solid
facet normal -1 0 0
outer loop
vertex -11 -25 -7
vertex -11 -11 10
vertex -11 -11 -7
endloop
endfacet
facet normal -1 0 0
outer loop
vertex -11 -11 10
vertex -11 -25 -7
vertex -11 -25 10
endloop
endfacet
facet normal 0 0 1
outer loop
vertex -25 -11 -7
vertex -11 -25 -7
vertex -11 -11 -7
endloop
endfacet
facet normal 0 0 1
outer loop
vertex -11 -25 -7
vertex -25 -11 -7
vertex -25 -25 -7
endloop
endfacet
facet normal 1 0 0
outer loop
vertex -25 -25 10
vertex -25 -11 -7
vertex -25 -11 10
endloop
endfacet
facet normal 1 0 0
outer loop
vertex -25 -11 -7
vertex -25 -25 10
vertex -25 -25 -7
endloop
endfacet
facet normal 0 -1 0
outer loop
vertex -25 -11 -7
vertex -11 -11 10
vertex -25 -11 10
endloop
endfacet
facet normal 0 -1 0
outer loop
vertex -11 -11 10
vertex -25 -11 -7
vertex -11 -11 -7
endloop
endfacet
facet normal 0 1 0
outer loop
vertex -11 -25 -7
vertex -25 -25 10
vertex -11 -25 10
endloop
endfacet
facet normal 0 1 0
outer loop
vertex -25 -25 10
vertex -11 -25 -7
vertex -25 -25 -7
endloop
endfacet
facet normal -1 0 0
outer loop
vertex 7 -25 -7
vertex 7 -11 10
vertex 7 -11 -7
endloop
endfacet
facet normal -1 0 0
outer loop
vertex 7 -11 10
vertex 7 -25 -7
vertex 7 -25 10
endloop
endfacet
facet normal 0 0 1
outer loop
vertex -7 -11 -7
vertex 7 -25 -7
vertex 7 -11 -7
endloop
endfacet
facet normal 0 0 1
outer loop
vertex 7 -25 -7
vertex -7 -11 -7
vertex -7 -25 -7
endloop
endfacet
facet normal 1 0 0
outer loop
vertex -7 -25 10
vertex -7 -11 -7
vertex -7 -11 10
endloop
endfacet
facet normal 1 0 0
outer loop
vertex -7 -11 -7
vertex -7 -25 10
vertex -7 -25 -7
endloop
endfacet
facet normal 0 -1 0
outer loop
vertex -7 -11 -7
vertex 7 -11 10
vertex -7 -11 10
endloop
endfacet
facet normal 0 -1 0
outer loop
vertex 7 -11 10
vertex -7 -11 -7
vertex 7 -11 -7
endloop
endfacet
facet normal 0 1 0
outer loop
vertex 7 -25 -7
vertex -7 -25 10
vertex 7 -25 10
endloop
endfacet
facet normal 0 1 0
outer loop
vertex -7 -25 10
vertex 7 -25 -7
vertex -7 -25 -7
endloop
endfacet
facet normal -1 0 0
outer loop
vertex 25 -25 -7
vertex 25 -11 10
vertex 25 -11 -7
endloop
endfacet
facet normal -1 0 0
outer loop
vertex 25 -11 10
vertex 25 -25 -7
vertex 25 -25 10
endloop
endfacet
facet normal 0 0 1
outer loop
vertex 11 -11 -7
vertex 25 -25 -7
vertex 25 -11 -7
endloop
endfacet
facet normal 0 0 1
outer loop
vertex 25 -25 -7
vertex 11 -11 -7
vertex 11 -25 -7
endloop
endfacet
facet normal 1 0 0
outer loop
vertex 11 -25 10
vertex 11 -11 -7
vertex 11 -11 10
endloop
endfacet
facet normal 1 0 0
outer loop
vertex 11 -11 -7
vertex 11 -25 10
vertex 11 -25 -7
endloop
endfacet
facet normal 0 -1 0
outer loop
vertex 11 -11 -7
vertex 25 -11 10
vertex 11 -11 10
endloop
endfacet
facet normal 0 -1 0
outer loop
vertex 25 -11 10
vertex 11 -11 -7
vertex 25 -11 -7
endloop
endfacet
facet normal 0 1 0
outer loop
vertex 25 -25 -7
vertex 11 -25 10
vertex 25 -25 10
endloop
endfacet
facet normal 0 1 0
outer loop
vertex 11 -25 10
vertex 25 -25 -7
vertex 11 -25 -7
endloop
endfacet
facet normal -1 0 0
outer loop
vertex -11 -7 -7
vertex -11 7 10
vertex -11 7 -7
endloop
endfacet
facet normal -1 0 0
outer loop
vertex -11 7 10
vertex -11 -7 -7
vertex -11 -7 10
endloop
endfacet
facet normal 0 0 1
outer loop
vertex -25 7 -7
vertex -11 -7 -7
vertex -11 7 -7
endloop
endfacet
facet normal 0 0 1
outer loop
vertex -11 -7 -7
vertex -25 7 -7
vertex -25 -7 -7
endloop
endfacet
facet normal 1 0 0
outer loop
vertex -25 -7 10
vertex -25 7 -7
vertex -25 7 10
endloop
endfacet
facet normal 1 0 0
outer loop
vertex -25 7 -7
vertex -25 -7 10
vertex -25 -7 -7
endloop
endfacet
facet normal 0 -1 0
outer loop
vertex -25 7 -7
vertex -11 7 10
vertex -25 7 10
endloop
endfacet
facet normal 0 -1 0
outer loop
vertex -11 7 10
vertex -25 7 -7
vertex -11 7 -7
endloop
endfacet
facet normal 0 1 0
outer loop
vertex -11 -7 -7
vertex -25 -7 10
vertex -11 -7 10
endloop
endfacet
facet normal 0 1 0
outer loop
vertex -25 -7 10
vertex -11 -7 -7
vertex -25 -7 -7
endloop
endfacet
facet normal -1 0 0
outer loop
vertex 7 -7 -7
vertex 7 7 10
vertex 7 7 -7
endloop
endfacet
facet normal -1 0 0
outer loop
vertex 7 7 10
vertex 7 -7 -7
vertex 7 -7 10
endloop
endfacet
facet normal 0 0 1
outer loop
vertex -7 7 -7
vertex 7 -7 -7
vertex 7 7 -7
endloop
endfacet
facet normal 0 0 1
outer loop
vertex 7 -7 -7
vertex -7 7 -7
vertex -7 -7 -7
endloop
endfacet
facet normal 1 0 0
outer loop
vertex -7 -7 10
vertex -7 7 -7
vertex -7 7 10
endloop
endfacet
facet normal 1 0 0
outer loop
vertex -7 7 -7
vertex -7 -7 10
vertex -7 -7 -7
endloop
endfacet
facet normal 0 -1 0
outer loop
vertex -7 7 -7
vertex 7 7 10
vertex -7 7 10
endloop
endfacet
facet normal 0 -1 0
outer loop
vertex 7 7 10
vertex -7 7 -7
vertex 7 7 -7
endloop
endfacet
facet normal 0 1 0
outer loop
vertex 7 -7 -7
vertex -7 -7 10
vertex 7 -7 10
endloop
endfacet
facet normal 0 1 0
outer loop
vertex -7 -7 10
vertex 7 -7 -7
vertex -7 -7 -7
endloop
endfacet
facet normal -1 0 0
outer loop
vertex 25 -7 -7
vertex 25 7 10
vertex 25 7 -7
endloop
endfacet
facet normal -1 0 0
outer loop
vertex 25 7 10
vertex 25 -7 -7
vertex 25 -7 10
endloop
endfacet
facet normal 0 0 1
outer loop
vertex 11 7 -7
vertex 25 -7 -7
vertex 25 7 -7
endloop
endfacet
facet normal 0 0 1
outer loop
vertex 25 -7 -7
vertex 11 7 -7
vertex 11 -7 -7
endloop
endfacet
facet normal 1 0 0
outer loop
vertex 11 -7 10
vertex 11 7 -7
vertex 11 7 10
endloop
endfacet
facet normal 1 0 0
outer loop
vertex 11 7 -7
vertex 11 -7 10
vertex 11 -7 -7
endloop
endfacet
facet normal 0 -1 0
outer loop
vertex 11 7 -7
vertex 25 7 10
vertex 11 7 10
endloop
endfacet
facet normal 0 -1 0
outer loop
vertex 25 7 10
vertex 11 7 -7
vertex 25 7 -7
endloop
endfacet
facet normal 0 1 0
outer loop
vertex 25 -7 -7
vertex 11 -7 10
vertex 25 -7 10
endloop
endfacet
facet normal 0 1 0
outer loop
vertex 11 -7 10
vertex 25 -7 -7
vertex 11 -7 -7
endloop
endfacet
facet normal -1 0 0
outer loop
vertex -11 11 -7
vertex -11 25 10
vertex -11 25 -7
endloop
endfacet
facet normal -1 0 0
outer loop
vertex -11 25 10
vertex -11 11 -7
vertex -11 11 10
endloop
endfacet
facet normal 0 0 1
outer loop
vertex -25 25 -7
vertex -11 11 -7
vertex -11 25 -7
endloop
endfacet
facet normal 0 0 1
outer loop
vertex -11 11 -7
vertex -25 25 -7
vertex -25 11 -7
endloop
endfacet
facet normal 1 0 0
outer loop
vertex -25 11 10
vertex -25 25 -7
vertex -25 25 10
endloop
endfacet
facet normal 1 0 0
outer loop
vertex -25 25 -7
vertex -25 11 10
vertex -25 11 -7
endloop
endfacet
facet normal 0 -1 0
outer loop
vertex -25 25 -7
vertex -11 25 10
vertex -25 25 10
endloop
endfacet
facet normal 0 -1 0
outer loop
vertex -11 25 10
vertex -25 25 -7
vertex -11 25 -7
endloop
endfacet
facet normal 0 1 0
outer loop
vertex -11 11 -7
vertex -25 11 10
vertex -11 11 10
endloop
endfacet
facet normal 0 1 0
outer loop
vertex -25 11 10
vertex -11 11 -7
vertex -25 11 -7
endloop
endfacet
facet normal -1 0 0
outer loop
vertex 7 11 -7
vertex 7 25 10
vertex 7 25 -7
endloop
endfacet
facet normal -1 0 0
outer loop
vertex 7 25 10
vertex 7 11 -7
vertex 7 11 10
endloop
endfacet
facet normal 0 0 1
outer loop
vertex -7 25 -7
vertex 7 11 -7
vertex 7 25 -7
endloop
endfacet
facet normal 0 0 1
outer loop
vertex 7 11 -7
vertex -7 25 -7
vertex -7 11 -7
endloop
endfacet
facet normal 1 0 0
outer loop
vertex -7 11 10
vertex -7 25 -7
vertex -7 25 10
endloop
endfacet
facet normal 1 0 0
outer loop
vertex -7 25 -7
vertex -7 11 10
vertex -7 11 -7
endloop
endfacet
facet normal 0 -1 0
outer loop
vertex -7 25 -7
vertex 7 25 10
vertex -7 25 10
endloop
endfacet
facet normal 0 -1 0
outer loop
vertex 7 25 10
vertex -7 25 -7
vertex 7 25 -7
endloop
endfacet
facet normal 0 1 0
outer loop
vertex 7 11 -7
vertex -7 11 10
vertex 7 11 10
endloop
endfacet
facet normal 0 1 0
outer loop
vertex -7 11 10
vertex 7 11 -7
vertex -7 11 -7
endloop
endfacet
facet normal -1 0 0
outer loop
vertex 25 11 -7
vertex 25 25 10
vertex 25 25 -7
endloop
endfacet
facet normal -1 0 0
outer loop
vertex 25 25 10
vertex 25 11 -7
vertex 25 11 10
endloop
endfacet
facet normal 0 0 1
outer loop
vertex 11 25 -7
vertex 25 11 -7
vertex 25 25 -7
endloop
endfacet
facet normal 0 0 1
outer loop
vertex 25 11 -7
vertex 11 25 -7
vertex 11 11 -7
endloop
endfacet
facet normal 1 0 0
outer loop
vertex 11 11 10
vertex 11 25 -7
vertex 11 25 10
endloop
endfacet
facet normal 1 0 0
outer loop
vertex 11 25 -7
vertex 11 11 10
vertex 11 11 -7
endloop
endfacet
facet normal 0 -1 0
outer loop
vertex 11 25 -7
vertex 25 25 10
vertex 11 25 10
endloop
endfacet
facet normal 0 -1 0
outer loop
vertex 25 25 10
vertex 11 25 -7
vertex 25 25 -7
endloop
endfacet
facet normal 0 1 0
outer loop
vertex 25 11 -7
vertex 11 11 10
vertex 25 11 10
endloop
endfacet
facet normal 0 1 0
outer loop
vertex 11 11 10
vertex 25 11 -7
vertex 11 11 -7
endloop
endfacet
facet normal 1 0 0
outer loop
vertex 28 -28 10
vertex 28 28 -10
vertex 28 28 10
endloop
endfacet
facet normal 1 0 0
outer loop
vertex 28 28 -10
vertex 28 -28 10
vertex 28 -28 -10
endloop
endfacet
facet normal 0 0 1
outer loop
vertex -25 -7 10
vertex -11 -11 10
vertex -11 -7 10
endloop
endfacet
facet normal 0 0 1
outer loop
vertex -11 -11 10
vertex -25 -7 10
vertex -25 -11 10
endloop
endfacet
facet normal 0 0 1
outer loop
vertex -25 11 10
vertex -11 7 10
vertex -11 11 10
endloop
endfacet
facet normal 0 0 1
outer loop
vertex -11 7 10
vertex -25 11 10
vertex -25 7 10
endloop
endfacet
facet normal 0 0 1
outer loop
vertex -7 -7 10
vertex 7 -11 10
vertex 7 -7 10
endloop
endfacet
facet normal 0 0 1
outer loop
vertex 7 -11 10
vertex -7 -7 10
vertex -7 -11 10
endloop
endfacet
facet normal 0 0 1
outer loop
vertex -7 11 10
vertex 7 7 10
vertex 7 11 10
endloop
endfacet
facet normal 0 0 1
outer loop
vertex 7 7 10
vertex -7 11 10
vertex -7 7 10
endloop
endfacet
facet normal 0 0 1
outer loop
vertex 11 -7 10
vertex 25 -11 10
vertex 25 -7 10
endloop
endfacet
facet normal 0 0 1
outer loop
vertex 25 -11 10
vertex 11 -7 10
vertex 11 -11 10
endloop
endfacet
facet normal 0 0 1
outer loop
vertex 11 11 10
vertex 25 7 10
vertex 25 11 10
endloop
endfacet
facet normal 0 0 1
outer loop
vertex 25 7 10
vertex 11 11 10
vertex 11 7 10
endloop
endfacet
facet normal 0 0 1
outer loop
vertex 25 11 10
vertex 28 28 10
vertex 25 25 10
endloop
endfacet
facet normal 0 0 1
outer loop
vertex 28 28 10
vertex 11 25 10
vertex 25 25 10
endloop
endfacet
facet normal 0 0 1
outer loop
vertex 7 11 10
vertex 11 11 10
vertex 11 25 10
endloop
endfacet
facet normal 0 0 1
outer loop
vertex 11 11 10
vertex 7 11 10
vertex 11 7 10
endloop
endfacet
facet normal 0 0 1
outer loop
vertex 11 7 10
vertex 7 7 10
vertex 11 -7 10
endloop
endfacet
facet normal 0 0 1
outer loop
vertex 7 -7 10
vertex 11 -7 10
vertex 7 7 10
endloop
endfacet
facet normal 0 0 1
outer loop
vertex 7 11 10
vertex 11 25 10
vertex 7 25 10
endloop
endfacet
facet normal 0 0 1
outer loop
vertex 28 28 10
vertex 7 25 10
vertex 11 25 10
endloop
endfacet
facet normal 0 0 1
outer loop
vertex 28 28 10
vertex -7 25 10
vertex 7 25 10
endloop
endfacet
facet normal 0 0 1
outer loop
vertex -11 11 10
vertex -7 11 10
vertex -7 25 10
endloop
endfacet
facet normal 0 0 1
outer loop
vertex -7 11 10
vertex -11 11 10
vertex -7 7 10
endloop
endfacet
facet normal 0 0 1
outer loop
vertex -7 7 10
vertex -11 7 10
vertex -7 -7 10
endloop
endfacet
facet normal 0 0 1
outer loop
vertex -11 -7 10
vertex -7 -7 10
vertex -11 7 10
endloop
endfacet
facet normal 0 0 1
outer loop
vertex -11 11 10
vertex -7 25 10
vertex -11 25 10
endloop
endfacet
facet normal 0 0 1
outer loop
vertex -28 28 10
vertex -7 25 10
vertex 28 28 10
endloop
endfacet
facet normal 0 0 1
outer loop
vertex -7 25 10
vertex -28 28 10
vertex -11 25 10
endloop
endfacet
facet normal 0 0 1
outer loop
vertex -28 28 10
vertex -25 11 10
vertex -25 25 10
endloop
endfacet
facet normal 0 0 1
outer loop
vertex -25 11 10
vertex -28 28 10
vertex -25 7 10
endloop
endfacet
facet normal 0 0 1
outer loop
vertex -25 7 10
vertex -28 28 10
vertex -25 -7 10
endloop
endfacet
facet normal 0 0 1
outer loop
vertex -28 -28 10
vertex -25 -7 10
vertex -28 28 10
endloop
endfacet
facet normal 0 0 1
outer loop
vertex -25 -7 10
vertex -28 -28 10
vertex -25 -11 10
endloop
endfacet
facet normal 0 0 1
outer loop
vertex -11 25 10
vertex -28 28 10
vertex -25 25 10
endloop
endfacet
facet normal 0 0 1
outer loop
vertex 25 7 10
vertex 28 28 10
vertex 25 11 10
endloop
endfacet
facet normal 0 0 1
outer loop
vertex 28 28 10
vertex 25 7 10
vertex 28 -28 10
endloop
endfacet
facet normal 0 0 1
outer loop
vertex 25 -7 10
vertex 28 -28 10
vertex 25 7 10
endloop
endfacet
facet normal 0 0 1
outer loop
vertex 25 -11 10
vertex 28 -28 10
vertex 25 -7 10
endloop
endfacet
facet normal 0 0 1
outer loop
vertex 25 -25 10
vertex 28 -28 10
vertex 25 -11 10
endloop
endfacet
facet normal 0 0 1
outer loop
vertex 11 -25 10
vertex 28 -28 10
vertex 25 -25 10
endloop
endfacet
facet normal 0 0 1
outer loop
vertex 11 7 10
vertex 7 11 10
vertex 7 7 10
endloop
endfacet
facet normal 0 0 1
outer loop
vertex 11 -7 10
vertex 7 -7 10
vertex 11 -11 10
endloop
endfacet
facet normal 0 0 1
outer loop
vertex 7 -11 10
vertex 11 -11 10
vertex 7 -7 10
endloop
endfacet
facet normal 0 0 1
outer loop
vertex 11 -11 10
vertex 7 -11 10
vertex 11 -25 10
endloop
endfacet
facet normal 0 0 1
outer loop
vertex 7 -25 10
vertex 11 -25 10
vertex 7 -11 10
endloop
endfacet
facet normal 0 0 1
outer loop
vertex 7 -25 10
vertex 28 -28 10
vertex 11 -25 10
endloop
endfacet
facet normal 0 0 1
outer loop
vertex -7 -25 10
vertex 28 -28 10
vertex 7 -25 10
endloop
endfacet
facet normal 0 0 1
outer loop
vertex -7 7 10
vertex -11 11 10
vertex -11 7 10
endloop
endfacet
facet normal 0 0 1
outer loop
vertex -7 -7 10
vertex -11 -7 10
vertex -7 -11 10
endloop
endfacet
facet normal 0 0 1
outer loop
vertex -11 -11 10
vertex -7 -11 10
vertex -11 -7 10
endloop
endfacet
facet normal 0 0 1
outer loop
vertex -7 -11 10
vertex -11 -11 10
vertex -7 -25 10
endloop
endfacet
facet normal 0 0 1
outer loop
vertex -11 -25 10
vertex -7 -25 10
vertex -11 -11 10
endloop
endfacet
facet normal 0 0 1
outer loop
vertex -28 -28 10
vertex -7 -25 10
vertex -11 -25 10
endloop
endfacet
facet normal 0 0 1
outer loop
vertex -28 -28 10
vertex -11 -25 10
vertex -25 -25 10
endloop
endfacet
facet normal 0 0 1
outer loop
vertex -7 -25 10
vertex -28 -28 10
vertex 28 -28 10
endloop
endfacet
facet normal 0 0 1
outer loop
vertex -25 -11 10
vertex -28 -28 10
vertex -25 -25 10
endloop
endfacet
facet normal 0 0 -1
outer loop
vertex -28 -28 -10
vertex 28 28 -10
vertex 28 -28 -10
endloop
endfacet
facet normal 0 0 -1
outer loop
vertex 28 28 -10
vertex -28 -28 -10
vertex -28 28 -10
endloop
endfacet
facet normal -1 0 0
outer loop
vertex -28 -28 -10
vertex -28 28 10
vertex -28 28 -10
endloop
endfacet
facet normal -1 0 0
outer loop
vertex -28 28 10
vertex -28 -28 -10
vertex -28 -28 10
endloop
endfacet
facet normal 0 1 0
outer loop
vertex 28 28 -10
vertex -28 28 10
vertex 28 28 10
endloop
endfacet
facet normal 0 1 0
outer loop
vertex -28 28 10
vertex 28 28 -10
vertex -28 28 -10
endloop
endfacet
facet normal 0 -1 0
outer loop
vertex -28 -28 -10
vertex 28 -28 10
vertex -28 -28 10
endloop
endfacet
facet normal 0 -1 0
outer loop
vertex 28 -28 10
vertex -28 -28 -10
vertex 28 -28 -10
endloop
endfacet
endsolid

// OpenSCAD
$fn = 32;

// ----------------------------------------------------------------------
// Pocket plate 56 x 56 x 20
// 3 x 3 pockets 14 mm square, 17 mm deep
// ----------------------------------------------------------------------

// --- parameters (mm) ---
thickness = 20;  // plate thickness
floor_t = 3;     // material left under each pocket
pocket = 14;     // pocket side length
pitch_x = 18;    // pocket pitch along X
pitch_y = 18;    // pocket pitch along Y
cols = 3;        // pockets per row
rows = 3;        // rows of pockets

// --- derived feature positions (mm) ---
depth = thickness - floor_t;        // = 17   pocket depth, down to the floor
span_x = (cols - 1) * pitch_x;      // = 36   distance between outer pockets
span_y = (rows - 1) * pitch_y;      // = 36   distance between outer pocket rows
origin_x = -span_x / 2;             // = -18   X of the first pocket
origin_y = -span_y / 2;             // = -18   Y of the first pocket
plate = [span_x + pocket + 6, span_y + pocket + 6, thickness];  // = [56, 56, 20]   overall size: pockets plus 3 mm of wall on each side
feature_centers = [
  [origin_x + 0 * pitch_x, origin_y + 0 * pitch_y],
  [origin_x + 1 * pitch_x, origin_y + 0 * pitch_y],
  [origin_x + 2 * pitch_x, origin_y + 0 * pitch_y],
  [origin_x + 0 * pitch_x, origin_y + 1 * pitch_y],
  [origin_x + 1 * pitch_x, origin_y + 1 * pitch_y],
  [origin_x + 2 * pitch_x, origin_y + 1 * pitch_y],
  [origin_x + 0 * pitch_x, origin_y + 2 * pitch_y],
  [origin_x + 1 * pitch_x, origin_y + 2 * pitch_y],
  [origin_x + 2 * pitch_x, origin_y + 2 * pitch_y]
];   // pocket centres, used verbatim by the cutter loop

// plate outline, then one pocket per centre in feature_centers
difference() {
  cube(plate, center = true);
  for (centre = feature_centers)
    translate([centre[0] - pocket / 2, centre[1] - pocket / 2, plate[2] / 2 - depth])
      cube([pocket, pocket, depth + 1]);  // centred on the declared pocket centre
}
